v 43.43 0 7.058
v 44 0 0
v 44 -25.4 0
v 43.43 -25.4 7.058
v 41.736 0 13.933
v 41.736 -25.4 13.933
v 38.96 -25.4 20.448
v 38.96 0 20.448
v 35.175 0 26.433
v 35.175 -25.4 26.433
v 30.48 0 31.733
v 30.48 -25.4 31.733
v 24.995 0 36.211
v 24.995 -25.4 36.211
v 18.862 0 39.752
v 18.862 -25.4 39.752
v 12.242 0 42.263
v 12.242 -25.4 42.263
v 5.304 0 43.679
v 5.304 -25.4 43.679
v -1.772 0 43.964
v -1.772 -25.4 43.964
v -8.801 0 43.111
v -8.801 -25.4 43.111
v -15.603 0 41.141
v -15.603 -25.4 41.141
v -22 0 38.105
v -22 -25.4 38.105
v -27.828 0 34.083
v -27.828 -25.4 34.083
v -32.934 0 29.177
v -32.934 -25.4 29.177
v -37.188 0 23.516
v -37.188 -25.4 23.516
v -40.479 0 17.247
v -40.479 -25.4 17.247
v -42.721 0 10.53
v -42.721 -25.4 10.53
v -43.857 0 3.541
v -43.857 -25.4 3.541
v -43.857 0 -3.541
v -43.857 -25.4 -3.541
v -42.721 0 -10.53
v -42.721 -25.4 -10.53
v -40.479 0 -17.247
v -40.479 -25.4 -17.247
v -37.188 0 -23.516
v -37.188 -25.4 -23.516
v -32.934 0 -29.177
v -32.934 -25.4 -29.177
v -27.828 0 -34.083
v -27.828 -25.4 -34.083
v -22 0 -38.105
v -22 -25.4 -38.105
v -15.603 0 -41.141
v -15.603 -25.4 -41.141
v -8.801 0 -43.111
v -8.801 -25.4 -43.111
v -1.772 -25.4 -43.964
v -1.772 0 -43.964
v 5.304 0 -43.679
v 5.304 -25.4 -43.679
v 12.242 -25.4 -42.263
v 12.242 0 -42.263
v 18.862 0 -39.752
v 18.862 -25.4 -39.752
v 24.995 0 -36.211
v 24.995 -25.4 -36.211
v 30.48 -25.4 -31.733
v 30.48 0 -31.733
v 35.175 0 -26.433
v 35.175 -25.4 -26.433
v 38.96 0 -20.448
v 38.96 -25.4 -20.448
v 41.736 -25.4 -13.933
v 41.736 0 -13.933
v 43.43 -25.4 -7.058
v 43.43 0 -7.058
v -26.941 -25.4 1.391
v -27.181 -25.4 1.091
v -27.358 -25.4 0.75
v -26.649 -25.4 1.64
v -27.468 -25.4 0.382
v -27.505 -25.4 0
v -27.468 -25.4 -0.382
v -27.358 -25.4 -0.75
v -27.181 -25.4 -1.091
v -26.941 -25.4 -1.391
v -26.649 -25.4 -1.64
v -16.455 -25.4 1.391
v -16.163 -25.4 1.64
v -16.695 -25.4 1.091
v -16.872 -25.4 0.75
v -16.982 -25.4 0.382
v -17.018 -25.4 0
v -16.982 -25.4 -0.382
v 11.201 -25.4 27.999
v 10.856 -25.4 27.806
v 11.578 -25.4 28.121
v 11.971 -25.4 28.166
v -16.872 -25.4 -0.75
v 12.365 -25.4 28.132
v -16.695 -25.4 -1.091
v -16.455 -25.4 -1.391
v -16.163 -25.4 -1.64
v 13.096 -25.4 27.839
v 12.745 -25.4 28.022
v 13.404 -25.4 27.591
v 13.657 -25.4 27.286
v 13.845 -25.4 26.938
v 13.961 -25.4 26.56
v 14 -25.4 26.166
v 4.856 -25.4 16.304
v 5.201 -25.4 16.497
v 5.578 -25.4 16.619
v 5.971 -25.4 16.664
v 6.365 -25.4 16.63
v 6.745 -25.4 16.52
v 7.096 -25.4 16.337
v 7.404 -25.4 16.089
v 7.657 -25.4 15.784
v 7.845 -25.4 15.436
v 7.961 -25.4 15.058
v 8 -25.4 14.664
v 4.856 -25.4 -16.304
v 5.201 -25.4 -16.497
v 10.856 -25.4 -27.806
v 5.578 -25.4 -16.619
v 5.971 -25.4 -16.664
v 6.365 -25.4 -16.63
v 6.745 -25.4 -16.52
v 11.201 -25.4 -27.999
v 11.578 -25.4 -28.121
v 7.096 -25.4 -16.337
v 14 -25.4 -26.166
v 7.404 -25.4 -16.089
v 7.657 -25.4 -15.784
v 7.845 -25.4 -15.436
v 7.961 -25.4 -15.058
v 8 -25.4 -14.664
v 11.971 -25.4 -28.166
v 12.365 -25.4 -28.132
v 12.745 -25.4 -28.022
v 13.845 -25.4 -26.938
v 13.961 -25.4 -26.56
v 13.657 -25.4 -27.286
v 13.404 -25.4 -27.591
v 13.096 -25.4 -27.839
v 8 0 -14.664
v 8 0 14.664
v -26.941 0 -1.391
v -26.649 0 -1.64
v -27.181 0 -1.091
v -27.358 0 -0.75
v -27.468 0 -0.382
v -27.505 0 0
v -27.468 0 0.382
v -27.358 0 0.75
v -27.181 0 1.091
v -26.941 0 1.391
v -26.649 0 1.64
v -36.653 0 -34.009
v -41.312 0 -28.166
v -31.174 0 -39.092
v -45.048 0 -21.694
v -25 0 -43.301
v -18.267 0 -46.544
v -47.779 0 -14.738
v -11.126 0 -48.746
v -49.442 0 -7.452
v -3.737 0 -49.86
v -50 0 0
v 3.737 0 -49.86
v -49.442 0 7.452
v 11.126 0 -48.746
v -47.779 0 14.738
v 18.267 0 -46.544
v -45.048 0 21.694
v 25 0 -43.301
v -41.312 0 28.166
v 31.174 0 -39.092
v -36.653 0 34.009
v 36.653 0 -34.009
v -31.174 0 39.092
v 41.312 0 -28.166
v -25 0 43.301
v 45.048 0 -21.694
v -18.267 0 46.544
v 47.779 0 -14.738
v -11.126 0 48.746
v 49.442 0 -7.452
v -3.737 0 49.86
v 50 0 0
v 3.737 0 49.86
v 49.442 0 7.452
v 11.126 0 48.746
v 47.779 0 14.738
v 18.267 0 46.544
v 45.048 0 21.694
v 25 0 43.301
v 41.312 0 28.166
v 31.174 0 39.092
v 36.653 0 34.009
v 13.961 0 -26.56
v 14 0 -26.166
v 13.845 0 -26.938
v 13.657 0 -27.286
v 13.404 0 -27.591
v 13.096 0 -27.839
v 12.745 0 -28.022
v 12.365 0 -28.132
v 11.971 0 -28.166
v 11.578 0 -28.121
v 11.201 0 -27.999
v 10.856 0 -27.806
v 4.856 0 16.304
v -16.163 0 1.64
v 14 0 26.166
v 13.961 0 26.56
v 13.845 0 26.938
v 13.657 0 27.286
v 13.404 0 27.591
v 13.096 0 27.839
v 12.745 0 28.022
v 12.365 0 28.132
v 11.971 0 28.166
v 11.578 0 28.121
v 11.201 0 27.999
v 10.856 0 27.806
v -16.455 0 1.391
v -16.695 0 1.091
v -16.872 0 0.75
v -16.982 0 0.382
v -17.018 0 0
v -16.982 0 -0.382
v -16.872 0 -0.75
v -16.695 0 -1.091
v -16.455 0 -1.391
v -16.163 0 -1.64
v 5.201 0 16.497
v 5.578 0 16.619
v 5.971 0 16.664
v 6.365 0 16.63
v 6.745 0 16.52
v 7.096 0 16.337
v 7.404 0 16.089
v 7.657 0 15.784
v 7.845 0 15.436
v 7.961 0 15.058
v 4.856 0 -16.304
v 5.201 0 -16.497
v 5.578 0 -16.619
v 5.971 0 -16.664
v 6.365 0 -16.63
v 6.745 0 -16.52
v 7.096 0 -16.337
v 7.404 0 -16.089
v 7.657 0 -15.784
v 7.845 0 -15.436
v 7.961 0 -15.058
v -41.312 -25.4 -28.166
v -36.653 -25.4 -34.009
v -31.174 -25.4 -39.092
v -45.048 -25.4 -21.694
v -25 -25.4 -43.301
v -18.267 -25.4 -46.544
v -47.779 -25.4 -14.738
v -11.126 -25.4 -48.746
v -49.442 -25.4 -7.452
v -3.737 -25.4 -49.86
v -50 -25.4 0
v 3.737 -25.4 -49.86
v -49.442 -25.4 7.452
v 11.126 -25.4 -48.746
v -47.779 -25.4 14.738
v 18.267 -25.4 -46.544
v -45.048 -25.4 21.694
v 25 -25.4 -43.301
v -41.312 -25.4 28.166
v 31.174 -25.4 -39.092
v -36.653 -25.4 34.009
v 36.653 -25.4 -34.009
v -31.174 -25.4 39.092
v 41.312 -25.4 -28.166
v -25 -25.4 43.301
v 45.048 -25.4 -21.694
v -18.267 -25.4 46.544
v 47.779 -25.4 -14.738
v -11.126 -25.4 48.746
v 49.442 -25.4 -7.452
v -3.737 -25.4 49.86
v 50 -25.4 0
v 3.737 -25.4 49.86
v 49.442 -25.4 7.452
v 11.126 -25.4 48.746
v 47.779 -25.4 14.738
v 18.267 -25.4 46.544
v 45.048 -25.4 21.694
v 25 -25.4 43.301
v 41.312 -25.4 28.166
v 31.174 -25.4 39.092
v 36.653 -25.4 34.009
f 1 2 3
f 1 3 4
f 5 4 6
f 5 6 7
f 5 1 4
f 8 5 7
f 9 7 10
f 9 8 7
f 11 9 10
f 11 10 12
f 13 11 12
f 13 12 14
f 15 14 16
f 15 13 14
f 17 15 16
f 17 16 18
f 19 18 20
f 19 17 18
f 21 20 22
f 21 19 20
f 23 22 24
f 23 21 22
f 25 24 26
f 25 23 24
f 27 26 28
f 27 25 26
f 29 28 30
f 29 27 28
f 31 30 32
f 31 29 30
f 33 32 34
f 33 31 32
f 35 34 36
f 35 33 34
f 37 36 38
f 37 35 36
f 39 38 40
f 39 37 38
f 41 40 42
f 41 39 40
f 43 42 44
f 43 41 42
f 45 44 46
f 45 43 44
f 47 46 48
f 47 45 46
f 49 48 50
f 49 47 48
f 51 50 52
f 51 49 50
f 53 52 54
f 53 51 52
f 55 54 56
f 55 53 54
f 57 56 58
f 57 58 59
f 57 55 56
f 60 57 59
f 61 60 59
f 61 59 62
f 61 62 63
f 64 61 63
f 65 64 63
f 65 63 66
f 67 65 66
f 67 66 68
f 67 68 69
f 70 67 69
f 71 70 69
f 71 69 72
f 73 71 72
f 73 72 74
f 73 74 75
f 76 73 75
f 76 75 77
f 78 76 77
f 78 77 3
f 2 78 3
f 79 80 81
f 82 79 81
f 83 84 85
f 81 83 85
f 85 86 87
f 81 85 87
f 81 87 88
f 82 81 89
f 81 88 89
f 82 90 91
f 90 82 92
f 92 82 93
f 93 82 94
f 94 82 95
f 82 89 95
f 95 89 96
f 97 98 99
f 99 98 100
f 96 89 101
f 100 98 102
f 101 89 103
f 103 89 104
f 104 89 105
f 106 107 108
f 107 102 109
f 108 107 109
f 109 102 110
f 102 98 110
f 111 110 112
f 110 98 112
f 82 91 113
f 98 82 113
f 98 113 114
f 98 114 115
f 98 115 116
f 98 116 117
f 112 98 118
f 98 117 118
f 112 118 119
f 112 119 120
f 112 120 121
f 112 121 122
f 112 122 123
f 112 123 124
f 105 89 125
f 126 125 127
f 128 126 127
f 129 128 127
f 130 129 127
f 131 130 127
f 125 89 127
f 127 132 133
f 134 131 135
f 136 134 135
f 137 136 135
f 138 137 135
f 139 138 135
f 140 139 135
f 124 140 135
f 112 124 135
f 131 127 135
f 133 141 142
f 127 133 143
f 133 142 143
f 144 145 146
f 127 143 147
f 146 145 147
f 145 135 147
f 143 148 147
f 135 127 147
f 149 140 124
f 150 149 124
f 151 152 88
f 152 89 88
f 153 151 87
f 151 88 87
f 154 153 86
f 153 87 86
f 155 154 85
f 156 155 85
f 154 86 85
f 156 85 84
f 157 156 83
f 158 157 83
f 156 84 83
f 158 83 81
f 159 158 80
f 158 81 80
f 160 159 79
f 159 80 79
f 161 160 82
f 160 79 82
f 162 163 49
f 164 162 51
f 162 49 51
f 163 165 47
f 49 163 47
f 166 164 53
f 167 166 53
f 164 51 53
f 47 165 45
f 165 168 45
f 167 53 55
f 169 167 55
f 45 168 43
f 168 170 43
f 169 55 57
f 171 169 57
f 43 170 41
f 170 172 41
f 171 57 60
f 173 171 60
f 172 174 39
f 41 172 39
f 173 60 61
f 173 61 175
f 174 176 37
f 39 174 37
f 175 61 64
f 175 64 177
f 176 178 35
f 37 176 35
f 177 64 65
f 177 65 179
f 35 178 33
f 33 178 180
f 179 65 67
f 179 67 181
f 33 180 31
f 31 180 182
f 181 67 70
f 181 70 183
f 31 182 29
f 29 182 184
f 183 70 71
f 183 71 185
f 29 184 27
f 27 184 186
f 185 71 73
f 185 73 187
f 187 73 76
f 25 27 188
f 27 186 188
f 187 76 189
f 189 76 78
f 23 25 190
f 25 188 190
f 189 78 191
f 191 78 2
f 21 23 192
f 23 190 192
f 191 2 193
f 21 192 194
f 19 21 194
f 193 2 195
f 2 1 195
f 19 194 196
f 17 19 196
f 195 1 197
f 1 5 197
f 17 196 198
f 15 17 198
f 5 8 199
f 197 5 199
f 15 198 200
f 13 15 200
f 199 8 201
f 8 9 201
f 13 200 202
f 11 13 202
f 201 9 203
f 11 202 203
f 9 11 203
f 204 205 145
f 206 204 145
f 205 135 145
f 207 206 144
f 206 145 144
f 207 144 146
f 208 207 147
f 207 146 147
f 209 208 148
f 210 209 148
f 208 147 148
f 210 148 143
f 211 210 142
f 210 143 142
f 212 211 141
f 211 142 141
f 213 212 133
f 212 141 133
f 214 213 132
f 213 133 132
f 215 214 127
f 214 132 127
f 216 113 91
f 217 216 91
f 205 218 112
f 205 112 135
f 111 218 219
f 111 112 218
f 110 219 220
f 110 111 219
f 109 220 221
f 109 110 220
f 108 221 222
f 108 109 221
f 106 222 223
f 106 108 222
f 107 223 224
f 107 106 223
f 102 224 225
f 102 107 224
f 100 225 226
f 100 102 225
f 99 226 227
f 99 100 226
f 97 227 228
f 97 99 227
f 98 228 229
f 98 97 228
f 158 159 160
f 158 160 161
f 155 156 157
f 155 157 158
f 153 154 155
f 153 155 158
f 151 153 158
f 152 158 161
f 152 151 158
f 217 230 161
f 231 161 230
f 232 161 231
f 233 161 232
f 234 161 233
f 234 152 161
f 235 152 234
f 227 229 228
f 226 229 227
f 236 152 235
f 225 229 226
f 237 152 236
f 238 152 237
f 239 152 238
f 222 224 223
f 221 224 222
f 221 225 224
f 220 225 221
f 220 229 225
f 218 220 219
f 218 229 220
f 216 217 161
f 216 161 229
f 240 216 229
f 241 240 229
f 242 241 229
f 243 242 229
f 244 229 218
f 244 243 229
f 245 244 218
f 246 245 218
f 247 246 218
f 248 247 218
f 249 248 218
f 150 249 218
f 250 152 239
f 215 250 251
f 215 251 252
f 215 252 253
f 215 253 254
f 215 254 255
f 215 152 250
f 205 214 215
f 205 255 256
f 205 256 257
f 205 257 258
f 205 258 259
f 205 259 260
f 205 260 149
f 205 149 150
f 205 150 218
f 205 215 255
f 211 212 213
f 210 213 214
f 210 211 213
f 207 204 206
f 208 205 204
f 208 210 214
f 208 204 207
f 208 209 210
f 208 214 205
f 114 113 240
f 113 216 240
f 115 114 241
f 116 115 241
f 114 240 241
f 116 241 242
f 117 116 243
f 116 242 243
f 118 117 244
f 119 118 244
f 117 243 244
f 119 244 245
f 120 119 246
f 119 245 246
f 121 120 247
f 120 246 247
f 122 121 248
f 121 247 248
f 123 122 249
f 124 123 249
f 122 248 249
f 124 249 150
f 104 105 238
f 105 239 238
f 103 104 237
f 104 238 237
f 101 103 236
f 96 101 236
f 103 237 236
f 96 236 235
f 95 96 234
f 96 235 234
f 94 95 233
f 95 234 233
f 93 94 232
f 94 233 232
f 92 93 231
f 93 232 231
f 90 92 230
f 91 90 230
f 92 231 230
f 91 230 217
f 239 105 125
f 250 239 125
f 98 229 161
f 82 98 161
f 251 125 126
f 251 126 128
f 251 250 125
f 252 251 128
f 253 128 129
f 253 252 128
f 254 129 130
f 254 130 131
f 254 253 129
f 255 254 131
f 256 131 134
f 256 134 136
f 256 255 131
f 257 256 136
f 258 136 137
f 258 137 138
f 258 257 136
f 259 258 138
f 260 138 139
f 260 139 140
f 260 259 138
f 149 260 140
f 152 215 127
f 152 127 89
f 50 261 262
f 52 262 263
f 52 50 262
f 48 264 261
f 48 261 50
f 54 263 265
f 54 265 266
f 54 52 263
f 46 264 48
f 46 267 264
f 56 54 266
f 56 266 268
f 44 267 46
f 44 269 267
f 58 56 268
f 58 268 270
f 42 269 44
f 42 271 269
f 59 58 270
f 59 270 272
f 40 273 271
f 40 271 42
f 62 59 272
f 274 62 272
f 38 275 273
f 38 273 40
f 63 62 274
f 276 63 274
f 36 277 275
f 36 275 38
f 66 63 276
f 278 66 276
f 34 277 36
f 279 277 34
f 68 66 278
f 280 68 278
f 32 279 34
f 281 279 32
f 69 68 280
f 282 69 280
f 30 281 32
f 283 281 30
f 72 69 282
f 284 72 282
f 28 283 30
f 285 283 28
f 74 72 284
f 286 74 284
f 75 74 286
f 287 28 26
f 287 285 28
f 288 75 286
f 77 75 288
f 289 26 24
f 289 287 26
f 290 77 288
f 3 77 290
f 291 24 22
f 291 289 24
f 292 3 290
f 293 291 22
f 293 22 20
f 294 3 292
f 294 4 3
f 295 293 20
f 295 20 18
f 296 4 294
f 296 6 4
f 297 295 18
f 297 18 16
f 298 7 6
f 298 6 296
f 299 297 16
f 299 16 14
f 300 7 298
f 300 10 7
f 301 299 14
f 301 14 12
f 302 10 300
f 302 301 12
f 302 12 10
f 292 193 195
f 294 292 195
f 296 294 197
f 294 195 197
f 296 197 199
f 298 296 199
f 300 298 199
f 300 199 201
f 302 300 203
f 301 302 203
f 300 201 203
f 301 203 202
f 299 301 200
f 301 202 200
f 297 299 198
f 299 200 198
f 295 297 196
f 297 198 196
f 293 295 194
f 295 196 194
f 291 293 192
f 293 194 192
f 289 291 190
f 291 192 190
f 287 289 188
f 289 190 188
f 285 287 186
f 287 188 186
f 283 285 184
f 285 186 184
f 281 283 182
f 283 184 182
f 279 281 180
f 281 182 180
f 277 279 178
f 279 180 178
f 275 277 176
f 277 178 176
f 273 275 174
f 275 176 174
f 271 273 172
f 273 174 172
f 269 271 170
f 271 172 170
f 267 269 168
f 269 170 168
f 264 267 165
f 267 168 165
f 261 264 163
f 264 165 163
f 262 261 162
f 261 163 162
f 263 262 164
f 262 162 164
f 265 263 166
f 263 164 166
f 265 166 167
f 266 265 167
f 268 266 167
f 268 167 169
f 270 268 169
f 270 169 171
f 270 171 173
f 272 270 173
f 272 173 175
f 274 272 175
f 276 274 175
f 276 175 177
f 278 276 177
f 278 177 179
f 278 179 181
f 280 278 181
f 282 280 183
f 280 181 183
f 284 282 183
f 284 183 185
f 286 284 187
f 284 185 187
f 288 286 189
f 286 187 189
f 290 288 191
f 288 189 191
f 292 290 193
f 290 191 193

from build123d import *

# Parameters (mm, degrees)
F0_R     = 50
F0_R_2   = 44
F1_DEPTH = 25.4
F2_DEPTH = 25.4
F5_DEPTH = 25.4
F6_R     = 2


# Not quite as in the source:
# - a feature names something its author has since deleted; it is built from what else it names


with BuildPart() as f1:
    # F0 (on Front) → F1 (new body)
    with BuildSketch(Plane.XZ):
        Circle(F0_R)
        Circle(F0_R_2, mode=Mode.SUBTRACT)
    extrude(amount=F1_DEPTH)


with BuildPart() as f2:
    # F0 (on Front) → F2 (new body)
    with BuildSketch(Plane.XZ):
        Polygon((-29, 0), (0, 0), (14, 0), (14, 30), align=None)
    extrude(amount=F2_DEPTH)

    # F3: F2 across face


with BuildPart() as f2_1:
    add(f2.part)
    add(f2.part.mirror(Plane(origin=(-7.5, -12.7, 0), x_dir=(1, 0, 0), z_dir=(0, 0, -1))))

    # F4 (on face) → F5 (cut)
    with BuildSketch(Plane.XZ.offset(25.4)):
        Polygon((8, -18.4980129885), (8, 18.4980129885), (-18.5138186169, 0), align=None)
    extrude(amount=-F5_DEPTH, mode=Mode.SUBTRACT)

    # F6
    f6_edges = [f2_1.edges().sort_by_distance(p)[0] for p in [
        (14, -12.7, -30),
        (-29, -12.7, 0),
        (14, -12.7, 30),
        (8, -12.7, 18.498013),
        (-18.513819, -12.7, 0),
        (8, -12.7, -18.498013),
    ]]
    fillet(f6_edges, radius=F6_R)


solid = Compound([f1.part, f2_1.part])
